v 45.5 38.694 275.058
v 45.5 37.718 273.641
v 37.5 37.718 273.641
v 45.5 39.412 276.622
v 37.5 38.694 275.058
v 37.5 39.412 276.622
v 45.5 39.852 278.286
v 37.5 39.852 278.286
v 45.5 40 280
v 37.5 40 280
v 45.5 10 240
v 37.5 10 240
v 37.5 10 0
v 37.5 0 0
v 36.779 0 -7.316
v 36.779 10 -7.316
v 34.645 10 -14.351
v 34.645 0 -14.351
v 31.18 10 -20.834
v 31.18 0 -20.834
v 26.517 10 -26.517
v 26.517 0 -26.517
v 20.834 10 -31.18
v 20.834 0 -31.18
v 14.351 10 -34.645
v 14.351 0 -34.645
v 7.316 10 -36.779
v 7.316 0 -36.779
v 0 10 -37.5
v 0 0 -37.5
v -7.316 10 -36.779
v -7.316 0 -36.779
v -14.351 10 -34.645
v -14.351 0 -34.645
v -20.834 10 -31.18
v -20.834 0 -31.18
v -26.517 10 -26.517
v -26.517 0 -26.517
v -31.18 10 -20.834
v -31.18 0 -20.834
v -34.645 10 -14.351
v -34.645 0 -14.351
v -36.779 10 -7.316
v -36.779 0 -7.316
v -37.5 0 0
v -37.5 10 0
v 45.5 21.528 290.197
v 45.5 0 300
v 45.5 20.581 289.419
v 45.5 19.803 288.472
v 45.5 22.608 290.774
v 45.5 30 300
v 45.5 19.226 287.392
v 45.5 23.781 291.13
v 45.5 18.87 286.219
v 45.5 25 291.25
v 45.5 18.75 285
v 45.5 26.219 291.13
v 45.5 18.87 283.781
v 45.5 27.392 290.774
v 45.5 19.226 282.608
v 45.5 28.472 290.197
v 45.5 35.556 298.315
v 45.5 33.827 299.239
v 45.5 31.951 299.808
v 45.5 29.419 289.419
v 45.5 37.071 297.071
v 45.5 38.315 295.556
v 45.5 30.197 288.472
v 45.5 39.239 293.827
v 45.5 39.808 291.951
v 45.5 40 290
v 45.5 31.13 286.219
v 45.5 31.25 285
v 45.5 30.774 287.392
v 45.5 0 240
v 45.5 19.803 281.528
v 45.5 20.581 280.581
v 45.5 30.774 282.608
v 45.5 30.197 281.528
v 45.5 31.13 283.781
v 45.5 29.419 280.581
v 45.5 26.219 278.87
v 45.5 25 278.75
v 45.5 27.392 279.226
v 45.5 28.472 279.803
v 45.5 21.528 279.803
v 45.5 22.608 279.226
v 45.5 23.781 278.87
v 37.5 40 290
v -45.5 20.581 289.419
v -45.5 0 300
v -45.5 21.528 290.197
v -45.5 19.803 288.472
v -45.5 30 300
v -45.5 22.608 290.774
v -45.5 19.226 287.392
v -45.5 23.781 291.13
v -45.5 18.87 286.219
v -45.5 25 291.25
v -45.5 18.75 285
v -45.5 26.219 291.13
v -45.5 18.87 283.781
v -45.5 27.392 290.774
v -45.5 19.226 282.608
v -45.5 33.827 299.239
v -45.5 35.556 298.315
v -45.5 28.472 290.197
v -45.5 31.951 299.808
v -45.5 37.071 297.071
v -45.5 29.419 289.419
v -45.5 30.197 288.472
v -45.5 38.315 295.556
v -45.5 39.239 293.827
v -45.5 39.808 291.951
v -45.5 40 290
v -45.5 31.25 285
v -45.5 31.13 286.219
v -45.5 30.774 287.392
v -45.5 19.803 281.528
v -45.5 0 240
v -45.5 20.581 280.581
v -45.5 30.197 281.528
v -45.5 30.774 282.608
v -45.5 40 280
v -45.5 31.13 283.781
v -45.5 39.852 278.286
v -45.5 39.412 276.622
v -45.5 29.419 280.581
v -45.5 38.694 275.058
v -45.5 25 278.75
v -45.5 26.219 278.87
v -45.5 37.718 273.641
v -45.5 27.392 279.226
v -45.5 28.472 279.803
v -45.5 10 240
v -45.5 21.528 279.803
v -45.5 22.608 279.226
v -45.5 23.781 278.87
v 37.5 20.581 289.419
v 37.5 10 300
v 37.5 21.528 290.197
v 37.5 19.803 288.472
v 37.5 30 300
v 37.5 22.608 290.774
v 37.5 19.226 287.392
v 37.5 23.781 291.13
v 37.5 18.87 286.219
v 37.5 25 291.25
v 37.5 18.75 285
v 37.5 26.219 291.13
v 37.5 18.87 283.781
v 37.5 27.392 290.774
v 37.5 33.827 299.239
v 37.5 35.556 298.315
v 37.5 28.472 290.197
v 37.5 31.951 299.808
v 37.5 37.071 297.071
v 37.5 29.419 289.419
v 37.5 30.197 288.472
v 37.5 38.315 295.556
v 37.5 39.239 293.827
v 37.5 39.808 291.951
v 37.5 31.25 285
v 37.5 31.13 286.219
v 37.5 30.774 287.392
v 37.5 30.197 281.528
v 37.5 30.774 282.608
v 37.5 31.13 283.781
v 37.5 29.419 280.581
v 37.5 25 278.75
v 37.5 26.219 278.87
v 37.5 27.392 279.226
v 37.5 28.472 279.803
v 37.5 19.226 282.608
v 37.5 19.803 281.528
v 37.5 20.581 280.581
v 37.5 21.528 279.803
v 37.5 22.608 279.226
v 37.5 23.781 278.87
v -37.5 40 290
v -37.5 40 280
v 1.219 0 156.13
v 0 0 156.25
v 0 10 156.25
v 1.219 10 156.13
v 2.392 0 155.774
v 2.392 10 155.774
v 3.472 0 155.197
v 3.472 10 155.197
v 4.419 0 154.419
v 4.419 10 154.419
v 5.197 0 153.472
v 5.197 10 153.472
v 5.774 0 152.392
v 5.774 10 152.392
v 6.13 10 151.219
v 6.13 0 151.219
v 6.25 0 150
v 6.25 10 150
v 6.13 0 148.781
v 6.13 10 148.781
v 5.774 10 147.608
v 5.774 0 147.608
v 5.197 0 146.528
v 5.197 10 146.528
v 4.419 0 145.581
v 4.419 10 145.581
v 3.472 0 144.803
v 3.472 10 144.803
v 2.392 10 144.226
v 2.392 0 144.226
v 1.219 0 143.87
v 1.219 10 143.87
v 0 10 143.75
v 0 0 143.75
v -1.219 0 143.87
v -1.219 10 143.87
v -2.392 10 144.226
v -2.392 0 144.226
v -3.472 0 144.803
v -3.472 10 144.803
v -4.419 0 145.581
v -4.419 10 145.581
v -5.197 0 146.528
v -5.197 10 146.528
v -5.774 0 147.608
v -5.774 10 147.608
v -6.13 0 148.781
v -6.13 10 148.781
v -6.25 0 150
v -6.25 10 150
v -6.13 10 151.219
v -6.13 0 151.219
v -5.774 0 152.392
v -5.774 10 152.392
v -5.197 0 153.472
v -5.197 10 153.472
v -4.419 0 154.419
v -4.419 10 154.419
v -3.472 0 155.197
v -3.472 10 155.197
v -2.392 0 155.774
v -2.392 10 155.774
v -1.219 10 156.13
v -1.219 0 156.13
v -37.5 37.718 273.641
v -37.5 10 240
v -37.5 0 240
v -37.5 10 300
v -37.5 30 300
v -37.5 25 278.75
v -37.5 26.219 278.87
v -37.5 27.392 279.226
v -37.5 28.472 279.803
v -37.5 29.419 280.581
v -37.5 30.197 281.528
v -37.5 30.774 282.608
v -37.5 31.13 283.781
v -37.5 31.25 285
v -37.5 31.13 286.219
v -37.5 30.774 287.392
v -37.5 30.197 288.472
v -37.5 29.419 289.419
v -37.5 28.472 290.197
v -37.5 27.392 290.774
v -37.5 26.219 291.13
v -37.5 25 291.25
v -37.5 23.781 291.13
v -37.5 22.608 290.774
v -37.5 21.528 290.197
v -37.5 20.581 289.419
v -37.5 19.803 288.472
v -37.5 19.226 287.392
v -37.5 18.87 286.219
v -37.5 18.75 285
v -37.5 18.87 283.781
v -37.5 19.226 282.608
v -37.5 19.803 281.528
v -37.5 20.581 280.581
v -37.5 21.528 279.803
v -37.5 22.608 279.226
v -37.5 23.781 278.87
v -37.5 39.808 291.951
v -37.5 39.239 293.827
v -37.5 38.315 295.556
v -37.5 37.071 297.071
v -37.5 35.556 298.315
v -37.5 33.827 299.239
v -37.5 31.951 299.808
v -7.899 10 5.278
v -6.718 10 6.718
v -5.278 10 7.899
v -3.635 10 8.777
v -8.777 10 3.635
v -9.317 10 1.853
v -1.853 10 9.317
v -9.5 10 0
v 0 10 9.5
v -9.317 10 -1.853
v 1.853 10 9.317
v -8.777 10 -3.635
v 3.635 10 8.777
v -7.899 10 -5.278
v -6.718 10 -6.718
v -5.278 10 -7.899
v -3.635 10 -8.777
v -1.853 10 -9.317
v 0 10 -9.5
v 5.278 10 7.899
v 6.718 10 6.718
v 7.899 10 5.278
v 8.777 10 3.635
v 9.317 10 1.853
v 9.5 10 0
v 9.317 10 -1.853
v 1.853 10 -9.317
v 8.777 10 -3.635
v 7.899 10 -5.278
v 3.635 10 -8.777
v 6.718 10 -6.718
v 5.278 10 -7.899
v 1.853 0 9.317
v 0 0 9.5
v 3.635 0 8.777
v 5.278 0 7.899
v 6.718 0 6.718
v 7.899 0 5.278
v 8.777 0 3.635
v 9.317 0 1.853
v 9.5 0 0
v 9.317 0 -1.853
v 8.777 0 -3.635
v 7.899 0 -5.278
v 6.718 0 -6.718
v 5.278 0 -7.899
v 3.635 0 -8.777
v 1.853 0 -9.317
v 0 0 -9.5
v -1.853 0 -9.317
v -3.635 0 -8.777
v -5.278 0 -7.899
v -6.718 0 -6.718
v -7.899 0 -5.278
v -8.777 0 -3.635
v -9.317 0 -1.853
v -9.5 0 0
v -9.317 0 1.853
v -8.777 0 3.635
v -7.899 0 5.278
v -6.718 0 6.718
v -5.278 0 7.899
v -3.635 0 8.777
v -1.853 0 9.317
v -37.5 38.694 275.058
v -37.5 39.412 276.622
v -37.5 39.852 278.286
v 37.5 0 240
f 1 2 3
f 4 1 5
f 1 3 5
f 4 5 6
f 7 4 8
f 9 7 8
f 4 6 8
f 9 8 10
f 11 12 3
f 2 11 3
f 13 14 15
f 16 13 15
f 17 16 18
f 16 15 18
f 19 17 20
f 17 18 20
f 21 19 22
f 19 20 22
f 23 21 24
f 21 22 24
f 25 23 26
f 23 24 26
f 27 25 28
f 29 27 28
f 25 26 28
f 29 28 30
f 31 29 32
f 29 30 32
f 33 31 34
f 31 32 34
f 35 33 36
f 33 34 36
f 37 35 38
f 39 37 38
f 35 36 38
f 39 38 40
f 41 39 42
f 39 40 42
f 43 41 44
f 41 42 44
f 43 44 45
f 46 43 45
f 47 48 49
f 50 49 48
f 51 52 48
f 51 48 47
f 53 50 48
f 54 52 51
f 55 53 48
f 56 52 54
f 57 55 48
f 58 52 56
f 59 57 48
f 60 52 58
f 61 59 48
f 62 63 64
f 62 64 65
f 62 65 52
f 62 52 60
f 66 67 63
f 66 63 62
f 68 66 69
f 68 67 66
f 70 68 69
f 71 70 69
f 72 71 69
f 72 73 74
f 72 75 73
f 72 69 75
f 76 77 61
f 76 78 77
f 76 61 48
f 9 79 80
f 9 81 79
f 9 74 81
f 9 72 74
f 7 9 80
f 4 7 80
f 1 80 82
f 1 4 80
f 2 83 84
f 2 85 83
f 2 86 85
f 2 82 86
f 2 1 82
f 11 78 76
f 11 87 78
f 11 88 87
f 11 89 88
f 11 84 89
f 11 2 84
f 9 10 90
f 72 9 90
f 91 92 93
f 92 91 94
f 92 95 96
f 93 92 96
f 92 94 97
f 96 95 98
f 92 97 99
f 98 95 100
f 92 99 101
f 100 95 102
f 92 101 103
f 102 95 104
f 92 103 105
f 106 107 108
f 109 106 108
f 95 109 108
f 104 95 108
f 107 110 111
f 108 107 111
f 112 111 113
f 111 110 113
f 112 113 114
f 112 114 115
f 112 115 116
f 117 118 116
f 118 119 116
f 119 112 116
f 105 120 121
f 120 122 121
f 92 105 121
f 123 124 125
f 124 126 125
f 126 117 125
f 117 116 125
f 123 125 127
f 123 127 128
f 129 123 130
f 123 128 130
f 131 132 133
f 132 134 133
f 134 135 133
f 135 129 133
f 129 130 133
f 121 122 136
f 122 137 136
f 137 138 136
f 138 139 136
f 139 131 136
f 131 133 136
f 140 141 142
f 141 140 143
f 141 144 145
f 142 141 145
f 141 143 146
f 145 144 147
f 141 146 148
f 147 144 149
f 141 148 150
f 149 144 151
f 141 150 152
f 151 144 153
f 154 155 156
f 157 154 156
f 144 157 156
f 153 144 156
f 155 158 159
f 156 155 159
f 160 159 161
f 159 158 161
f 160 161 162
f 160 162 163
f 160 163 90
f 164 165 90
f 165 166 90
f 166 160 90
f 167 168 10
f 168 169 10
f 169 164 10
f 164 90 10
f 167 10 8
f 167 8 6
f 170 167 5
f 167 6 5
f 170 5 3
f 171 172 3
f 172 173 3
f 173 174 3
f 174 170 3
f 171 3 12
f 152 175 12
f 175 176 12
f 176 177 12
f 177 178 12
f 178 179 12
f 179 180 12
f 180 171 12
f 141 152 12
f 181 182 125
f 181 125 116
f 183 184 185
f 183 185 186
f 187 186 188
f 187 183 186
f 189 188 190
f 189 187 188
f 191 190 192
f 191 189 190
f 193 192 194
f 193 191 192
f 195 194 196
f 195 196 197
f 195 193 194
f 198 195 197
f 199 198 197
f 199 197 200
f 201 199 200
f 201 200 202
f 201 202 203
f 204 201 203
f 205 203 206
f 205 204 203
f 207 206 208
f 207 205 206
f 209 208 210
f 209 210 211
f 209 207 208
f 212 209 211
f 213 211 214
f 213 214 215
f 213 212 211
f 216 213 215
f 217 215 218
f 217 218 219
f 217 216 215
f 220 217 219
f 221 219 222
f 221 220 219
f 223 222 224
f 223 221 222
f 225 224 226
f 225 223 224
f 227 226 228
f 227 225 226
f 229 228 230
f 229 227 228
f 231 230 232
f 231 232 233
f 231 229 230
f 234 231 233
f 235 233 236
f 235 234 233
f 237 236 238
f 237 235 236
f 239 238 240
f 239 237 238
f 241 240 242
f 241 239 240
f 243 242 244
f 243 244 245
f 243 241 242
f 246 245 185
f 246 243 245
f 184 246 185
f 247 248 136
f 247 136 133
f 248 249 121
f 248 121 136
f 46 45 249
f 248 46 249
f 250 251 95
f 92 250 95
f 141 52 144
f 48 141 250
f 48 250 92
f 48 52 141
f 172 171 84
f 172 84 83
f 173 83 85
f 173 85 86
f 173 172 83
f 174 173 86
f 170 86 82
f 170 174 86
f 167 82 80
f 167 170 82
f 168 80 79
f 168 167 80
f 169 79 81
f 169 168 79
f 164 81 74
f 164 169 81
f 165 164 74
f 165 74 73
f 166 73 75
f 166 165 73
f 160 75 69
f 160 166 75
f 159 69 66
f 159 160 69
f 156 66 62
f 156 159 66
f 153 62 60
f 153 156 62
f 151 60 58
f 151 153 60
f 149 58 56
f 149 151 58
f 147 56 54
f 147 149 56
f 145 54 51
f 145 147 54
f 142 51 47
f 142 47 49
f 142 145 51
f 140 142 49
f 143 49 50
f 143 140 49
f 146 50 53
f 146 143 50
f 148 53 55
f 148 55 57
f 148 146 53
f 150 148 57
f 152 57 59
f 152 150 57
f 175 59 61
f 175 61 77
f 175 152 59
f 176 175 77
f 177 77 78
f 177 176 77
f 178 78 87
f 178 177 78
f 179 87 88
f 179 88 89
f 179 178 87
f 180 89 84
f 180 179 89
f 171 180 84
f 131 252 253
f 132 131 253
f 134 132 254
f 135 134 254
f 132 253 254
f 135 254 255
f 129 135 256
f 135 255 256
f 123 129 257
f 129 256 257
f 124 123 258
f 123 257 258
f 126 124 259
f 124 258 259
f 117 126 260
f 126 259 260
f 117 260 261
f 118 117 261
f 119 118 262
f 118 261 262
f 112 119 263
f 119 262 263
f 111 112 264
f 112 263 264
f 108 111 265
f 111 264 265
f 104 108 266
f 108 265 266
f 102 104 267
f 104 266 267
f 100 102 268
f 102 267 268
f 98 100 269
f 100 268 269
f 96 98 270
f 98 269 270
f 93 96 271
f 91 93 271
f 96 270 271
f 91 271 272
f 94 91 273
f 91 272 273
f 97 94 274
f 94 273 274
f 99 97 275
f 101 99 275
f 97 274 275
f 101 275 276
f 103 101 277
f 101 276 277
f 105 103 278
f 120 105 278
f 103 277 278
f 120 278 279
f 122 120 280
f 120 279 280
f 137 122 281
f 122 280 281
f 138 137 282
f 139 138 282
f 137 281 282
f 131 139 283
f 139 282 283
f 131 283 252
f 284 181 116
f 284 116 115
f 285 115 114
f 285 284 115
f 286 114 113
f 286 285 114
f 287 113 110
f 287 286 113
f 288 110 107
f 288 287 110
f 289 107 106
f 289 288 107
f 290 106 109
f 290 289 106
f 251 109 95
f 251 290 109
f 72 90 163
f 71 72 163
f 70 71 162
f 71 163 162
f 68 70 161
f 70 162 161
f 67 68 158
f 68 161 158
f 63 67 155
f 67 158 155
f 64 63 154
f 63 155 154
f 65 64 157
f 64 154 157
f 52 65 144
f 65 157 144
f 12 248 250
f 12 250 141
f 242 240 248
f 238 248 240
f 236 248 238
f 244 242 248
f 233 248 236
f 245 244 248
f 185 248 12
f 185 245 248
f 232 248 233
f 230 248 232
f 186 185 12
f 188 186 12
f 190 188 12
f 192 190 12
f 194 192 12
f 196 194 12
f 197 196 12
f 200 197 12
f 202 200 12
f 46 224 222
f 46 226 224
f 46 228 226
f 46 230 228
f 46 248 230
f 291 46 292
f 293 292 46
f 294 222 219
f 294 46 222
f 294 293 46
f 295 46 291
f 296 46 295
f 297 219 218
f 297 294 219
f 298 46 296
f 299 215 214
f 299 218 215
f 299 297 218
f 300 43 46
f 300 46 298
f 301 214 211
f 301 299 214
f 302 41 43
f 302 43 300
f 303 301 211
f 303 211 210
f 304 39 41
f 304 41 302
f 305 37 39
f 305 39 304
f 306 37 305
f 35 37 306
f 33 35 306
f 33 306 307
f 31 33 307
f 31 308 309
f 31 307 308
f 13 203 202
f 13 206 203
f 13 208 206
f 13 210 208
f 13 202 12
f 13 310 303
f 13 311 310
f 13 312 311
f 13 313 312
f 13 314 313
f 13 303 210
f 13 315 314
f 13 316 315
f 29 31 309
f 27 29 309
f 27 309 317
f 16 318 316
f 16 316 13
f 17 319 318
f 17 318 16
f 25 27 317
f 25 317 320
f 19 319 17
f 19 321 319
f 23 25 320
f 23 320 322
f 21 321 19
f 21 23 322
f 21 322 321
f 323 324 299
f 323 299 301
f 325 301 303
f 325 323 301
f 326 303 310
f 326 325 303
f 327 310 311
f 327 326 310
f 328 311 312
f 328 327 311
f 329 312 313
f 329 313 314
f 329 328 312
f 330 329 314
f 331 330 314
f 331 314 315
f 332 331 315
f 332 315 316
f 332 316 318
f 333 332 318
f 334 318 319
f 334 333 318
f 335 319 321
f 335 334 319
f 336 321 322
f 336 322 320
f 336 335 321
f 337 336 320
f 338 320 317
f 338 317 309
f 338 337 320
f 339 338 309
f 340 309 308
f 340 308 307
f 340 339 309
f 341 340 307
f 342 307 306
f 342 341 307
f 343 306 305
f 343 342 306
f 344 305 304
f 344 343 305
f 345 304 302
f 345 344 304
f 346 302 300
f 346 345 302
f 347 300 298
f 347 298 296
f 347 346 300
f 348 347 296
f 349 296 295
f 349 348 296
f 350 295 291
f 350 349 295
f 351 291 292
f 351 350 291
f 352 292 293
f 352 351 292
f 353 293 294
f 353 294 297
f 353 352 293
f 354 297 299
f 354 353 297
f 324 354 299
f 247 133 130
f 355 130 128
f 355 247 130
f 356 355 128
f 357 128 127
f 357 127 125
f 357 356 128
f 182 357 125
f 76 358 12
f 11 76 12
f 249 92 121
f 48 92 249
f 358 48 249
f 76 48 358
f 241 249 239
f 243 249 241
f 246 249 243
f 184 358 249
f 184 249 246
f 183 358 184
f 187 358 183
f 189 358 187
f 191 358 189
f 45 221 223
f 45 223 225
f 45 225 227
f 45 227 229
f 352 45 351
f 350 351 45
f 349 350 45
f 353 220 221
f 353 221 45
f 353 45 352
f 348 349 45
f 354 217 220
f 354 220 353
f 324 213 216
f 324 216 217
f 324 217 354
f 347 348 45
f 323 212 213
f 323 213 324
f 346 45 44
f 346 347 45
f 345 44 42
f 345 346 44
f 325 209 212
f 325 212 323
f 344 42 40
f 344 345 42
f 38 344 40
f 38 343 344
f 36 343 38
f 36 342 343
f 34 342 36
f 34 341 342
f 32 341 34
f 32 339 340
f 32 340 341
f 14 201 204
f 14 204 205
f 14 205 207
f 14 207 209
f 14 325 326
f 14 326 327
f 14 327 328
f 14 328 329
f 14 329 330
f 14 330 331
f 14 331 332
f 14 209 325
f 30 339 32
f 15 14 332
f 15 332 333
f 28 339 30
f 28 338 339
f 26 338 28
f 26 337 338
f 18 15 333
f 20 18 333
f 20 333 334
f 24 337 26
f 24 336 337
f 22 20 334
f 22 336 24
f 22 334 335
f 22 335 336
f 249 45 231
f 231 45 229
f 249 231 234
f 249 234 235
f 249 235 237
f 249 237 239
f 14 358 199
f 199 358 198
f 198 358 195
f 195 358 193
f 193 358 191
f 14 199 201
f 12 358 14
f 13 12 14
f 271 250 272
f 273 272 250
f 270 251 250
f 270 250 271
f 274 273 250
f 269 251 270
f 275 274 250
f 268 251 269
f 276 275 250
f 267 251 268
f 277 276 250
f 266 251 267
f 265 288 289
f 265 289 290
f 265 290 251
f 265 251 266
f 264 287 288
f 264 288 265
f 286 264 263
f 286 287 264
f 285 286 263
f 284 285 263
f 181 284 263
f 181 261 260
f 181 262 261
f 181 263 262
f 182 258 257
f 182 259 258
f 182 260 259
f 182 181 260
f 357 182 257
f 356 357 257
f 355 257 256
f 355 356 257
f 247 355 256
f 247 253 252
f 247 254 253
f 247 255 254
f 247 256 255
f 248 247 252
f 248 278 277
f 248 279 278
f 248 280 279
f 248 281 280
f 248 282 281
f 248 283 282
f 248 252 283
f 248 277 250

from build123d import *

# Parameters (mm, degrees)
SKETCH1_R           = 6.25
SKETCH1_R_2         = 9.5
BOSS_EXTRUDE1_DEPTH = 10
SKETCH4_R           = 6.25
BOSS_EXTRUDE3_DEPTH = 8


with BuildPart() as part:
    # Sketch1 → Boss-Extrude1 (new body)
    with BuildSketch(Plane(origin=(0, 0, 0), x_dir=(1, 0, 0), z_dir=(0, 1, 0))):
        with BuildLine():
            Line((-37.5, 0), (-37.5, -300))
            Line((-37.5, -300), (37.5, -300))
            Line((37.5, -300), (37.5, 0))
            ThreePointArc((37.5, 0), (0, 37.5), (-37.5, 0))
        make_face()
        with Locations(Location((0, -150, 0), (0, 0, 270))):
            Circle(SKETCH1_R, mode=Mode.SUBTRACT)
        with Locations(Location((0, 0, 0), (0, 0, 270))):
            Circle(SKETCH1_R_2, mode=Mode.SUBTRACT)
    extrude(amount=BOSS_EXTRUDE1_DEPTH)

    # Sketch4 → Boss-Extrude3 (add)
    with BuildSketch(Plane(origin=(37.5, 0, 0), x_dir=(0, 0, -1), z_dir=(1, 0, 0))):
        with BuildLine():
            Line((-240, 0), (-240, 10))
            Line((-240, 10), (-273.641101056, 37.717797887))
            ThreePointArc((-273.641101056, 37.717797887), (-276.621981266, 39.412172408), (-280, 40))
            Line((-280, 40), (-290, 40))
            ThreePointArc((-290, 40), (-297.071067812, 37.071067812), (-300, 30))
            Line((-300, 30), (-300, 0))
            Line((-300, 0), (-240, 0))
        make_face()
        with Locations((-285, 25)):
            Circle(SKETCH4_R, mode=Mode.SUBTRACT)
    boss_extrude3 = extrude(amount=BOSS_EXTRUDE3_DEPTH)

    # Mirror1: Boss-Extrude3 across plane
    add(boss_extrude3.mirror(Plane(origin=(0, 0, 0), x_dir=(0, 0, 1), z_dir=(1, 0, 0))))


solid = part.part
